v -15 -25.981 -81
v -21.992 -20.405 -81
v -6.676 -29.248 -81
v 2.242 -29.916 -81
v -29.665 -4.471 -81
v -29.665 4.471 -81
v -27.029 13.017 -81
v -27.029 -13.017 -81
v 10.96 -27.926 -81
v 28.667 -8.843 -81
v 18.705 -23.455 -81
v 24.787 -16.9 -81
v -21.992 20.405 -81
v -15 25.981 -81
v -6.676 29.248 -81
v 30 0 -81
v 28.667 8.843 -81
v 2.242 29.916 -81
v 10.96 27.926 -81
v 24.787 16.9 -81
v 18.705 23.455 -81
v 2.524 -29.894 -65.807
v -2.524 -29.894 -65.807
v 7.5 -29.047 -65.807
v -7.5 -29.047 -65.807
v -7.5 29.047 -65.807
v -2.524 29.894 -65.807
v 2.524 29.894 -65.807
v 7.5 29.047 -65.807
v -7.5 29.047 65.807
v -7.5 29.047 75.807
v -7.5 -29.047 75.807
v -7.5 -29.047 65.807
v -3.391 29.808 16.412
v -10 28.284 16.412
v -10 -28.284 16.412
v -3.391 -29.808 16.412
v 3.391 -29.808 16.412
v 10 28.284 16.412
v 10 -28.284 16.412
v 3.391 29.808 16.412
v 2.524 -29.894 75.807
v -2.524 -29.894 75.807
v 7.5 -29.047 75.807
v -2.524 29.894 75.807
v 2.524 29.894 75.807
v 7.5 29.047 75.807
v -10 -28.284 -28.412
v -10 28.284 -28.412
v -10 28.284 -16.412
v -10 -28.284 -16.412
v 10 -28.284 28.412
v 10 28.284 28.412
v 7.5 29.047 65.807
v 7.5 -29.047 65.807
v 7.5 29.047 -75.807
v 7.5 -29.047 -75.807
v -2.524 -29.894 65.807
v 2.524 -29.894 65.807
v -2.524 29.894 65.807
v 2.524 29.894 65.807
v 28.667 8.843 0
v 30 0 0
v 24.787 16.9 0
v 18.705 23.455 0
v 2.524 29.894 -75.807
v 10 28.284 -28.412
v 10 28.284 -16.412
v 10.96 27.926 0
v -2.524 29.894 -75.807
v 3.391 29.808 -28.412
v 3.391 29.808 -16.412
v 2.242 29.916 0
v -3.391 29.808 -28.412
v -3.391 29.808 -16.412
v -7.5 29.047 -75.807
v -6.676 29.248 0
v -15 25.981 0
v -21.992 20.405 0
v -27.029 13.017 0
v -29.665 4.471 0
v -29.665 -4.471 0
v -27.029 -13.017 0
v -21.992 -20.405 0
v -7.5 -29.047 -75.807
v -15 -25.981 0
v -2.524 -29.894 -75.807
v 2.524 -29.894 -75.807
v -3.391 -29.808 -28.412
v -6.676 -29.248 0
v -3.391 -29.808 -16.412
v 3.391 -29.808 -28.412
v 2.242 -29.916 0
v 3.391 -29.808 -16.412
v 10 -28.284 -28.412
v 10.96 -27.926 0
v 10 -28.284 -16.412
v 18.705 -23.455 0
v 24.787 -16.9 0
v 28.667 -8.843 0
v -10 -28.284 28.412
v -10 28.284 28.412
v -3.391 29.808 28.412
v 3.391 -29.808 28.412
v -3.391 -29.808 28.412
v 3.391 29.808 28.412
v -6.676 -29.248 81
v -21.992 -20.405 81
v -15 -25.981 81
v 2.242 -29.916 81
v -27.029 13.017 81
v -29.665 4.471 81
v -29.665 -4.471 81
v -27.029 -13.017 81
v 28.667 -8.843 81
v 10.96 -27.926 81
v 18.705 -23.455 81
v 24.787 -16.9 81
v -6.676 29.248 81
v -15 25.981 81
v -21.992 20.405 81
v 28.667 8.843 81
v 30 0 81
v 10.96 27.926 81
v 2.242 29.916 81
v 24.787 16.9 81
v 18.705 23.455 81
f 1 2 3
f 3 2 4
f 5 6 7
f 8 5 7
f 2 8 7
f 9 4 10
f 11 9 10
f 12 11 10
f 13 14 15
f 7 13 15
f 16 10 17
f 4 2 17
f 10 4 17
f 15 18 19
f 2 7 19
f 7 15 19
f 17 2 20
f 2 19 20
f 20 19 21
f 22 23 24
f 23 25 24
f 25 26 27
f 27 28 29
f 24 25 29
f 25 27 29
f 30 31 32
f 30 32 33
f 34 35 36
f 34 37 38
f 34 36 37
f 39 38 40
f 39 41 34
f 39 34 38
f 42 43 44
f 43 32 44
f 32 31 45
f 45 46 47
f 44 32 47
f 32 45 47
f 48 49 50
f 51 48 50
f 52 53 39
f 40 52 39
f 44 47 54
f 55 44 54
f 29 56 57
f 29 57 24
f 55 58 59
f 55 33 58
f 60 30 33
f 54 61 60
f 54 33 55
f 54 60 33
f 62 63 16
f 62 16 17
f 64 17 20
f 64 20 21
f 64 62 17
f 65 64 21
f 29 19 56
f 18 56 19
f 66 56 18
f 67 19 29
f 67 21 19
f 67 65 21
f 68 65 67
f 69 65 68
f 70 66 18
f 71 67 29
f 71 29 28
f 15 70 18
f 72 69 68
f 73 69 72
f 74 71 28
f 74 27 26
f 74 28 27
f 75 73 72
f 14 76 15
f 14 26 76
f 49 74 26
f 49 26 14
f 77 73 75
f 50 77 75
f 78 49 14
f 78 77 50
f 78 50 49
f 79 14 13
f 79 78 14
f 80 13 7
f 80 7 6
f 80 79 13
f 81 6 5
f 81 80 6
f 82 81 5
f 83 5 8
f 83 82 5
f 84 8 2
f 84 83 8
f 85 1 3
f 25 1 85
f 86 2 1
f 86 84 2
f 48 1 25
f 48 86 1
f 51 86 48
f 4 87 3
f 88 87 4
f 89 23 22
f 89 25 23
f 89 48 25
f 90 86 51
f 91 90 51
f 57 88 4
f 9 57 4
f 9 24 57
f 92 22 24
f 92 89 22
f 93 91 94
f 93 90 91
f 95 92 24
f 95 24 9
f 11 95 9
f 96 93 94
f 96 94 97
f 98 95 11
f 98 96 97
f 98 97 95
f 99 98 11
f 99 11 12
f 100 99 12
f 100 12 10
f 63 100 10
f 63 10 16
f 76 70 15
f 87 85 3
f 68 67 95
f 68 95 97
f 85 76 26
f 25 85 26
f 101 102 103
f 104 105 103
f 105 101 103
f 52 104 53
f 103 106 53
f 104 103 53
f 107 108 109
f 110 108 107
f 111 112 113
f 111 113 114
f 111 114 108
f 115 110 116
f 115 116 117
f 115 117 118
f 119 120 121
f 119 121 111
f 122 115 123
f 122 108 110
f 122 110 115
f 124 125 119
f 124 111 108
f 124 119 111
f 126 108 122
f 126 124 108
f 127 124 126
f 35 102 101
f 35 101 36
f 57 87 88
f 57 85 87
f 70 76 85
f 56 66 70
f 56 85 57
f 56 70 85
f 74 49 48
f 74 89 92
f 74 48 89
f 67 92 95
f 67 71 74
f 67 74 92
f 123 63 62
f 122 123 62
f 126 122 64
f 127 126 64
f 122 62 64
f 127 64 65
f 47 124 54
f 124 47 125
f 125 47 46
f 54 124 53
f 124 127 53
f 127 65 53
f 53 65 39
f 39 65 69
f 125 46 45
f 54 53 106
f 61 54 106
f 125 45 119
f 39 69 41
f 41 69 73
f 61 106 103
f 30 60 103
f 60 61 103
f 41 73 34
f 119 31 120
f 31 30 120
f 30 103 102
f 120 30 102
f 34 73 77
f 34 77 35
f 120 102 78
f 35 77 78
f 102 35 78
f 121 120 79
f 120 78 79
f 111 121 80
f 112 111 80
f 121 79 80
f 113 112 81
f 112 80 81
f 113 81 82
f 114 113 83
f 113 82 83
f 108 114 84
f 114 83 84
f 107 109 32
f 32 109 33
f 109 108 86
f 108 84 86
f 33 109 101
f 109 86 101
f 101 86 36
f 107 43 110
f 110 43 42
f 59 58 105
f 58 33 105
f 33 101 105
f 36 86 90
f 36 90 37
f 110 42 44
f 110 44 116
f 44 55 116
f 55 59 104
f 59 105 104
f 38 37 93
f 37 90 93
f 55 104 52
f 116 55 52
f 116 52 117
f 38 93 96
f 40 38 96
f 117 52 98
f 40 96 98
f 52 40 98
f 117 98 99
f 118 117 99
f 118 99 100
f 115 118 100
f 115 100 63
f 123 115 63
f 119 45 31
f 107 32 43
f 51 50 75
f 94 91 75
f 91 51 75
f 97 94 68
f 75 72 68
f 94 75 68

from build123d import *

# Parameters (mm, degrees)
SKETCH1_R           = 30
BOSS_EXTRUDE6_DEPTH = 81
SKETCH3_W           = 20
SKETCH3_H           = 12
CUT_EXTRUDE1_DEPTH  = 40.5
SKETCH4_W           = 15
SKETCH4_H           = 10
CUT_EXTRUDE2_DEPTH  = 40.5


with BuildPart() as part:
    # Sketch1 → Boss-Extrude6 (new body)
    with BuildSketch(Plane.XY):
        Circle(SKETCH1_R)
    extrude(amount=BOSS_EXTRUDE6_DEPTH)

    # Sketch3 → Cut-Extrude1 (cut, symmetric)
    with BuildSketch(Plane(origin=(0, 0, 0), x_dir=(1, 0, 0), z_dir=(0, 1, 0))):
        with Locations((0, -22.411705079)):
            Rectangle(SKETCH3_W, SKETCH3_H)
    extrude(amount=CUT_EXTRUDE1_DEPTH, both=True, mode=Mode.SUBTRACT)

    # Sketch4 → Cut-Extrude2 (cut, symmetric)
    with BuildSketch(Plane(origin=(0, 0, 0), x_dir=(1, 0, 0), z_dir=(0, 1, 0))):
        with Locations((0, -70.806519959)):
            Rectangle(SKETCH4_W, SKETCH4_H)
    extrude(amount=CUT_EXTRUDE2_DEPTH, both=True, mode=Mode.SUBTRACT)

    # Mirror1: part across plane


with BuildPart() as part_1:
    add(part.part)
    add(part.part.mirror(Plane.XY))


solid = part_1.part
